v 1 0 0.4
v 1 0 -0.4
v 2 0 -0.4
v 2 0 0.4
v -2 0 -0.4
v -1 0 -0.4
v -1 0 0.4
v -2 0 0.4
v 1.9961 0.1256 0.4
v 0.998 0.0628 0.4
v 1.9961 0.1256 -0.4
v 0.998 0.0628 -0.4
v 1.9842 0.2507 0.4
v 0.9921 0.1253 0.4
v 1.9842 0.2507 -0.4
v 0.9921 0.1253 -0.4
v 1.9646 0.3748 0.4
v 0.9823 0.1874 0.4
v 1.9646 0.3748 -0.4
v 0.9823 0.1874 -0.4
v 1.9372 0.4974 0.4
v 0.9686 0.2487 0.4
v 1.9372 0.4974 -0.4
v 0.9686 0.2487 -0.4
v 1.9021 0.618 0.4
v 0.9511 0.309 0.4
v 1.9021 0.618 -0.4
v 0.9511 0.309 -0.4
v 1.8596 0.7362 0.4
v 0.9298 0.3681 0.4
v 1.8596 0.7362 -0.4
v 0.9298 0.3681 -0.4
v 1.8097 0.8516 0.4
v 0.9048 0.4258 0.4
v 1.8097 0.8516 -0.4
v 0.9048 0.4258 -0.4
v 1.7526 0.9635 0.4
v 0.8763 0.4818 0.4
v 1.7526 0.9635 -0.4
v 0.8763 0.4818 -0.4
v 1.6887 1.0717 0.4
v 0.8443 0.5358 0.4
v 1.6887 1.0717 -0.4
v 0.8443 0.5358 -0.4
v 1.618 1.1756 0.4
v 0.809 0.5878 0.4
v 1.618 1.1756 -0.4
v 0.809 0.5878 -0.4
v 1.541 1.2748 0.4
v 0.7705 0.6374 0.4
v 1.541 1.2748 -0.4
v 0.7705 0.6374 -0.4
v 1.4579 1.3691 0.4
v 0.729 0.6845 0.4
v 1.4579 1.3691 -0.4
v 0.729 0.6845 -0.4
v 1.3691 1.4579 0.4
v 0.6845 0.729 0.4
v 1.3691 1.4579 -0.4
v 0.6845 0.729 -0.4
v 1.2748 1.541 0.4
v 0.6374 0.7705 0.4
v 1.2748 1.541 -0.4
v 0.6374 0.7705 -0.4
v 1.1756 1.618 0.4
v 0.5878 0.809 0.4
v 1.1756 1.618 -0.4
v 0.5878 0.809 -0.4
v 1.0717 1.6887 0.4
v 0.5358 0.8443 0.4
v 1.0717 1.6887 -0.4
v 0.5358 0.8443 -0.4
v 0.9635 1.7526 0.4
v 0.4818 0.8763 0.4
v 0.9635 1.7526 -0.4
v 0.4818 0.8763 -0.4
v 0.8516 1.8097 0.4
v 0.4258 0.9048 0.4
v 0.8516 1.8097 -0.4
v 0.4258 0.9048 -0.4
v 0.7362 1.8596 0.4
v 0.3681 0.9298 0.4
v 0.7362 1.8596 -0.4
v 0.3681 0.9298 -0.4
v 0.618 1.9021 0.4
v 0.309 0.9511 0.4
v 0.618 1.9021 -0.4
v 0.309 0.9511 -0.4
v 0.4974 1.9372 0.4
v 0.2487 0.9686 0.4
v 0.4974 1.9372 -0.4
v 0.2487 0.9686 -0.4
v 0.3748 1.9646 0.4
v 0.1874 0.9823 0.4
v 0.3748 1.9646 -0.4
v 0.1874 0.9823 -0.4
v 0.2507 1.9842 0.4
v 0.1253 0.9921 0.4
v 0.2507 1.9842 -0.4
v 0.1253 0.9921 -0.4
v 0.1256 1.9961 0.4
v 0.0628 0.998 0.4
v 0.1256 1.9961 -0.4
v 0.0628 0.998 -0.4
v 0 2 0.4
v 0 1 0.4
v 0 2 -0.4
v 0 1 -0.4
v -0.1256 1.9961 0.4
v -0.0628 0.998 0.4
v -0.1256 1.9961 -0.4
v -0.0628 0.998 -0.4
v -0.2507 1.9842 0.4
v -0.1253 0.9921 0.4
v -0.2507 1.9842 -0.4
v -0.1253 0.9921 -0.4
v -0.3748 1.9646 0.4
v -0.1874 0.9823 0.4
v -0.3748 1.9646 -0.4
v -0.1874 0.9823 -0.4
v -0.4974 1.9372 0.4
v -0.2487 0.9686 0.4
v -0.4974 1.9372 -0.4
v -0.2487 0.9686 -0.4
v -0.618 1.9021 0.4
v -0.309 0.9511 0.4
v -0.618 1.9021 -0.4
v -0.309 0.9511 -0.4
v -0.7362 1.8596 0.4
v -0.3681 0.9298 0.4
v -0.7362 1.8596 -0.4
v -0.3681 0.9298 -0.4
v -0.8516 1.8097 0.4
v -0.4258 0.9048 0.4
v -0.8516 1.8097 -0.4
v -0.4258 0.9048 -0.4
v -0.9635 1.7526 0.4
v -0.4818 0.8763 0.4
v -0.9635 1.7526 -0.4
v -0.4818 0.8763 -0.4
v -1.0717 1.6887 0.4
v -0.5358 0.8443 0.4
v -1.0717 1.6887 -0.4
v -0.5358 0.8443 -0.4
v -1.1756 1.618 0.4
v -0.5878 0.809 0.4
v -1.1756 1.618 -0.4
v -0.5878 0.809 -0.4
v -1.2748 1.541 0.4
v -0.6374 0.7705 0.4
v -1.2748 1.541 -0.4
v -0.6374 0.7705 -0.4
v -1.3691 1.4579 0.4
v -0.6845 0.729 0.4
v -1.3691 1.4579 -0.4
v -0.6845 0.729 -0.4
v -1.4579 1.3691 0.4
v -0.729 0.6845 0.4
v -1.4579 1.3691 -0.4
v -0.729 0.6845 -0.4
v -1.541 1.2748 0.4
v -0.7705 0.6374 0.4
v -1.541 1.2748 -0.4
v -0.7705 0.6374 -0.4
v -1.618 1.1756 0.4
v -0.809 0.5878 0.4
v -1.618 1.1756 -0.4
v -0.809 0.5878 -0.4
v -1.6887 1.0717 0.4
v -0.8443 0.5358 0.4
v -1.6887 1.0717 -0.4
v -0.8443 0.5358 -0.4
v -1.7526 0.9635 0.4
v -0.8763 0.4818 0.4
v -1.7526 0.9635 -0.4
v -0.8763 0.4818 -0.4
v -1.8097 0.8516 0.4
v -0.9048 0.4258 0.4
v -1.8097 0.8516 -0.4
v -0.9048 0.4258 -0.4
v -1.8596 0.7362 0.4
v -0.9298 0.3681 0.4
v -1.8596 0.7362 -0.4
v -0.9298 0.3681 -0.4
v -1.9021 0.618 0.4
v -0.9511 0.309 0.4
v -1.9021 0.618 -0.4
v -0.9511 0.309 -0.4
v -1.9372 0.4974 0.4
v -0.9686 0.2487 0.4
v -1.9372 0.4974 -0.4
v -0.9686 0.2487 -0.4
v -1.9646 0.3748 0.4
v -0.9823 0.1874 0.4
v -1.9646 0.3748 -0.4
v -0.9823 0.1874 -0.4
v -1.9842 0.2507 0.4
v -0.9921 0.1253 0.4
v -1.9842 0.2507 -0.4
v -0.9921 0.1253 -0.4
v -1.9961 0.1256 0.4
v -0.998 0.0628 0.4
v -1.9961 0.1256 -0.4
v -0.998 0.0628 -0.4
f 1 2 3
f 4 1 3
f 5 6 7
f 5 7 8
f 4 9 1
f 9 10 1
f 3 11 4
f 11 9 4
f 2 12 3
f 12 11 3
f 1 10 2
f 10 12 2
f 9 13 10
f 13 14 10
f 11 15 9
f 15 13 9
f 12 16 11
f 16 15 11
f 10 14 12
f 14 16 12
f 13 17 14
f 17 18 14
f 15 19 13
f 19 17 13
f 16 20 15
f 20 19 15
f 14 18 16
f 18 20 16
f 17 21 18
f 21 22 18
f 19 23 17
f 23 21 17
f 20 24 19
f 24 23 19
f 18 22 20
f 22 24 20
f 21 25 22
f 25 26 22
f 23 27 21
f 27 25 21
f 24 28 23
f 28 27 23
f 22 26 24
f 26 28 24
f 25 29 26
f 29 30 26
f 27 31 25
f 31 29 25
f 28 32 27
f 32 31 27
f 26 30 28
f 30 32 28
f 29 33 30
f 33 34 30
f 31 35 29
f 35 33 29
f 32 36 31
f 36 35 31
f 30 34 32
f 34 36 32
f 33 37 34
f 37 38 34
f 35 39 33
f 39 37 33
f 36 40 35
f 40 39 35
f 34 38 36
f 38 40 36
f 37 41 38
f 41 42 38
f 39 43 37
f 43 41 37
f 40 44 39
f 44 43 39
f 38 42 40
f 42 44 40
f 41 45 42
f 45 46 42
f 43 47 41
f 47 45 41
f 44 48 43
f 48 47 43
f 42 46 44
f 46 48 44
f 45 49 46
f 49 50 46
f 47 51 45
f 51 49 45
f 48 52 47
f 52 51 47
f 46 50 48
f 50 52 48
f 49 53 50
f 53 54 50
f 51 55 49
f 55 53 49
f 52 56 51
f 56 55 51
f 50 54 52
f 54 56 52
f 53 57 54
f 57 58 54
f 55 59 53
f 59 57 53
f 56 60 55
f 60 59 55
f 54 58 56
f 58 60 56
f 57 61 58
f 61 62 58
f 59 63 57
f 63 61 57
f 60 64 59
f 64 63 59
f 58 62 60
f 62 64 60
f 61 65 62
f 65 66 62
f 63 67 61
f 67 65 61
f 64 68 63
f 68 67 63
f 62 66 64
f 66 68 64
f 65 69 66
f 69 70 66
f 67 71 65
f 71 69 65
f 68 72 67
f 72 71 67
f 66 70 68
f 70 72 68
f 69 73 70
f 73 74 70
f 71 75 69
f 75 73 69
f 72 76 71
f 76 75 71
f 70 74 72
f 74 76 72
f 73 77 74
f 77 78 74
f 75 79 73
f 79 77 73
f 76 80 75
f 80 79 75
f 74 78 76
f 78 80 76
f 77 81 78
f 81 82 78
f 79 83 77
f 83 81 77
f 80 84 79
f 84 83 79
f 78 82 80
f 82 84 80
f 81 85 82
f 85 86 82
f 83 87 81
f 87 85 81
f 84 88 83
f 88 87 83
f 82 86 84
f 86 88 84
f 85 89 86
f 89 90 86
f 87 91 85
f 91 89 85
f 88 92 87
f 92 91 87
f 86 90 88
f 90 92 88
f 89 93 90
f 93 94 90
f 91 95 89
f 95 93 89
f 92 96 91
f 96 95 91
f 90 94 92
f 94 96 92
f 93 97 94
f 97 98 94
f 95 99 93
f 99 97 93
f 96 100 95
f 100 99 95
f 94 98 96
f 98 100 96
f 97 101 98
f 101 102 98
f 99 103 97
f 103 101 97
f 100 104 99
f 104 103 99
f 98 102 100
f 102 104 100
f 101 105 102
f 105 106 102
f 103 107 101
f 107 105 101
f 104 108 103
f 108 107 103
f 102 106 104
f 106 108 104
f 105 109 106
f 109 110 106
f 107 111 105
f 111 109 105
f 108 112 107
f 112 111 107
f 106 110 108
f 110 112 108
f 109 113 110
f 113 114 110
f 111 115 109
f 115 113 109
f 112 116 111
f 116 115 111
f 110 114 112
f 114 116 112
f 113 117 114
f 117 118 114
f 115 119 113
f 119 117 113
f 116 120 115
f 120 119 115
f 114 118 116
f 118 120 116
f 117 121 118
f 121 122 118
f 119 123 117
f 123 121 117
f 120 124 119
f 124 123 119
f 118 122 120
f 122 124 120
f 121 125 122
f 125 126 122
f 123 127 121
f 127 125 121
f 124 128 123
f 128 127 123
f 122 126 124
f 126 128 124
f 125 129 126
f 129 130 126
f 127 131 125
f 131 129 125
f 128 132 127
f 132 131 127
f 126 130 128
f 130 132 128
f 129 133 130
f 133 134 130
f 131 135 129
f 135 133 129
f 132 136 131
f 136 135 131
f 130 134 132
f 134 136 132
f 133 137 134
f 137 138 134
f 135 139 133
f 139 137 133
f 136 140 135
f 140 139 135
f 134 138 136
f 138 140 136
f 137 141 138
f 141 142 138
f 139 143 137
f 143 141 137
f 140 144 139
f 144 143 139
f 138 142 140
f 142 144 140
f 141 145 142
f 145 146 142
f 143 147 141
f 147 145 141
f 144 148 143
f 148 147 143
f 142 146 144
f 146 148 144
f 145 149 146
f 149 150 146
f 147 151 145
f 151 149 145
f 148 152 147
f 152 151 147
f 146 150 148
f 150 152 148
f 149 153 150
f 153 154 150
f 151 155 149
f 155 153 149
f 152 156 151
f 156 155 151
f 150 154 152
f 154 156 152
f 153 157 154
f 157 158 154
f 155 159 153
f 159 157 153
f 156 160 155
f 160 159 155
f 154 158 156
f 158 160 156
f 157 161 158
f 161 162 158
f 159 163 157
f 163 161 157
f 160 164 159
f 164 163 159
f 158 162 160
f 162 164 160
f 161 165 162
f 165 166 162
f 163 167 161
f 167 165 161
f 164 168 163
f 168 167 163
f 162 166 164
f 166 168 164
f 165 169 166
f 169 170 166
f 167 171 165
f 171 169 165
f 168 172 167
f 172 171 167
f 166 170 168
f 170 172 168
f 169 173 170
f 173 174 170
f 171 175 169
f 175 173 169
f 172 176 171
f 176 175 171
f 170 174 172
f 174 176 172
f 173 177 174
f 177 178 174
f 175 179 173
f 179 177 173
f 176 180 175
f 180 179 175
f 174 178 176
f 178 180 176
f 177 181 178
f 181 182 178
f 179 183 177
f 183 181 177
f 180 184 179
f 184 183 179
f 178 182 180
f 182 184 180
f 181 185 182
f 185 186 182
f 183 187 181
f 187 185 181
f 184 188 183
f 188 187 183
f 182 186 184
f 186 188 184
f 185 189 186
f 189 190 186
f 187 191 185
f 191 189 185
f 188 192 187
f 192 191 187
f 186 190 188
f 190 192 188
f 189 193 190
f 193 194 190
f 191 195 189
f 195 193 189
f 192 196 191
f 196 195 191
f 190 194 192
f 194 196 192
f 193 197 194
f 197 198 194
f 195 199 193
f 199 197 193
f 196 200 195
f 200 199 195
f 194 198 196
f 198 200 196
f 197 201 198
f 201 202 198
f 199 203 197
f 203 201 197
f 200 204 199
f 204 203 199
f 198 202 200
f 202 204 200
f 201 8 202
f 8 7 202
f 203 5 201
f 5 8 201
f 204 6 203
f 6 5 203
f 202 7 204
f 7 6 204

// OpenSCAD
chan_size = [1, 0.8];

color("red") rotate_extrude(angle=180, convexity=10, $fn=100) translate([1.5, 0]) square(chan_size, true);

color("blue", 0.5) translate([1.5, 0]) square(chan_size, true);
